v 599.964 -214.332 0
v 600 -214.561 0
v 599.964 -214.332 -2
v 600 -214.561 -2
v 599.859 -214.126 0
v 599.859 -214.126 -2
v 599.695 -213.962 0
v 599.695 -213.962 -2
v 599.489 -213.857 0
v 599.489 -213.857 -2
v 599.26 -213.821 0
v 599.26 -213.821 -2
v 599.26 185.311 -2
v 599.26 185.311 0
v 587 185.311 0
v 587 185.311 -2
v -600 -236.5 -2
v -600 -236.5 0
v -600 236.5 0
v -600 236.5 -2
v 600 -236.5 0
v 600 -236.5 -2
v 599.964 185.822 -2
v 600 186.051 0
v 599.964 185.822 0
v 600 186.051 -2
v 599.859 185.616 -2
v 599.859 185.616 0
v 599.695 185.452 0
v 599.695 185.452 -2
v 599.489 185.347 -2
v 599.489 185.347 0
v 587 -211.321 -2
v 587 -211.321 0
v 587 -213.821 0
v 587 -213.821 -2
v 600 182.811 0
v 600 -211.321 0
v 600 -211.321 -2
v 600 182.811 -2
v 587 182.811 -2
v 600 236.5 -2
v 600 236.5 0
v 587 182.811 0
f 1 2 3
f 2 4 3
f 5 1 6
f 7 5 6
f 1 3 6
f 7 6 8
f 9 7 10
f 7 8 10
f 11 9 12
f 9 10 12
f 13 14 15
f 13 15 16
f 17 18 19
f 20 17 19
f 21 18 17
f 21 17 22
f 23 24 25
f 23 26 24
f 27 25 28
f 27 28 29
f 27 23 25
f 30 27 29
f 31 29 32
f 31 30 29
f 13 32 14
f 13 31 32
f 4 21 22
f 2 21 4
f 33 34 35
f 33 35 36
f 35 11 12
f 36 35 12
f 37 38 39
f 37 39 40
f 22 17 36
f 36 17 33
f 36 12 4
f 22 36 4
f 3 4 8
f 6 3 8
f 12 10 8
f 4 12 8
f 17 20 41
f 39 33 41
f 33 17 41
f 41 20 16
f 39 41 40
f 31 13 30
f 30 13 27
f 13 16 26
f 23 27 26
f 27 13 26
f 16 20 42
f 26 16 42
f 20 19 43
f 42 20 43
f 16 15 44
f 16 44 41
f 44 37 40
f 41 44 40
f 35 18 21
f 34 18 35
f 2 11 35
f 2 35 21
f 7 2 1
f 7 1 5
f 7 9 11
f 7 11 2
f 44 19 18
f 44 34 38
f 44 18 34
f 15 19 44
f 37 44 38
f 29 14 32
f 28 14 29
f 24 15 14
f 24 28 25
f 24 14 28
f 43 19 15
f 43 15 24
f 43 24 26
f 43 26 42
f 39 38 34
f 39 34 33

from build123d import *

# Parameters (mm, degrees)
SKETCH1_W          = 1200
SKETCH1_H          = 473
BASE_FLANGE1_DEPTH = 2
SKETCH2_W          = 2
SKETCH2_H          = 2.5
CUT_EXTRUDE1_DEPTH = 13
FILLET1_R          = 0.74


# Sheet-metal steps are written as plain solids
with BuildPart() as part:
    # Sketch1 → Base-Flange1 (new body)
    with BuildSketch(Plane.XY):
        Rectangle(SKETCH1_W, SKETCH1_H)
    extrude(amount=-BASE_FLANGE1_DEPTH)

    # Sketch2 → Cut-Extrude1 (cut)
    with BuildSketch(Plane(origin=(600, 0, 0), x_dir=(0, 0, -1), z_dir=(1, 0, 0))):
        with Locations((1, 184.060514082)):
            Rectangle(SKETCH2_W, SKETCH2_H)
        with Locations((1, -212.570674279)):
            Rectangle(SKETCH2_W, SKETCH2_H)
    extrude(amount=-CUT_EXTRUDE1_DEPTH, mode=Mode.SUBTRACT)

    # Fillet1
    fillet1_edges = [part.edges().sort_by_distance(p)[0] for p in [
        (600, 185.310514082, -1),
        (600, -213.820674279, -1),
    ]]
    fillet(fillet1_edges, radius=FILLET1_R)


solid = part.part
